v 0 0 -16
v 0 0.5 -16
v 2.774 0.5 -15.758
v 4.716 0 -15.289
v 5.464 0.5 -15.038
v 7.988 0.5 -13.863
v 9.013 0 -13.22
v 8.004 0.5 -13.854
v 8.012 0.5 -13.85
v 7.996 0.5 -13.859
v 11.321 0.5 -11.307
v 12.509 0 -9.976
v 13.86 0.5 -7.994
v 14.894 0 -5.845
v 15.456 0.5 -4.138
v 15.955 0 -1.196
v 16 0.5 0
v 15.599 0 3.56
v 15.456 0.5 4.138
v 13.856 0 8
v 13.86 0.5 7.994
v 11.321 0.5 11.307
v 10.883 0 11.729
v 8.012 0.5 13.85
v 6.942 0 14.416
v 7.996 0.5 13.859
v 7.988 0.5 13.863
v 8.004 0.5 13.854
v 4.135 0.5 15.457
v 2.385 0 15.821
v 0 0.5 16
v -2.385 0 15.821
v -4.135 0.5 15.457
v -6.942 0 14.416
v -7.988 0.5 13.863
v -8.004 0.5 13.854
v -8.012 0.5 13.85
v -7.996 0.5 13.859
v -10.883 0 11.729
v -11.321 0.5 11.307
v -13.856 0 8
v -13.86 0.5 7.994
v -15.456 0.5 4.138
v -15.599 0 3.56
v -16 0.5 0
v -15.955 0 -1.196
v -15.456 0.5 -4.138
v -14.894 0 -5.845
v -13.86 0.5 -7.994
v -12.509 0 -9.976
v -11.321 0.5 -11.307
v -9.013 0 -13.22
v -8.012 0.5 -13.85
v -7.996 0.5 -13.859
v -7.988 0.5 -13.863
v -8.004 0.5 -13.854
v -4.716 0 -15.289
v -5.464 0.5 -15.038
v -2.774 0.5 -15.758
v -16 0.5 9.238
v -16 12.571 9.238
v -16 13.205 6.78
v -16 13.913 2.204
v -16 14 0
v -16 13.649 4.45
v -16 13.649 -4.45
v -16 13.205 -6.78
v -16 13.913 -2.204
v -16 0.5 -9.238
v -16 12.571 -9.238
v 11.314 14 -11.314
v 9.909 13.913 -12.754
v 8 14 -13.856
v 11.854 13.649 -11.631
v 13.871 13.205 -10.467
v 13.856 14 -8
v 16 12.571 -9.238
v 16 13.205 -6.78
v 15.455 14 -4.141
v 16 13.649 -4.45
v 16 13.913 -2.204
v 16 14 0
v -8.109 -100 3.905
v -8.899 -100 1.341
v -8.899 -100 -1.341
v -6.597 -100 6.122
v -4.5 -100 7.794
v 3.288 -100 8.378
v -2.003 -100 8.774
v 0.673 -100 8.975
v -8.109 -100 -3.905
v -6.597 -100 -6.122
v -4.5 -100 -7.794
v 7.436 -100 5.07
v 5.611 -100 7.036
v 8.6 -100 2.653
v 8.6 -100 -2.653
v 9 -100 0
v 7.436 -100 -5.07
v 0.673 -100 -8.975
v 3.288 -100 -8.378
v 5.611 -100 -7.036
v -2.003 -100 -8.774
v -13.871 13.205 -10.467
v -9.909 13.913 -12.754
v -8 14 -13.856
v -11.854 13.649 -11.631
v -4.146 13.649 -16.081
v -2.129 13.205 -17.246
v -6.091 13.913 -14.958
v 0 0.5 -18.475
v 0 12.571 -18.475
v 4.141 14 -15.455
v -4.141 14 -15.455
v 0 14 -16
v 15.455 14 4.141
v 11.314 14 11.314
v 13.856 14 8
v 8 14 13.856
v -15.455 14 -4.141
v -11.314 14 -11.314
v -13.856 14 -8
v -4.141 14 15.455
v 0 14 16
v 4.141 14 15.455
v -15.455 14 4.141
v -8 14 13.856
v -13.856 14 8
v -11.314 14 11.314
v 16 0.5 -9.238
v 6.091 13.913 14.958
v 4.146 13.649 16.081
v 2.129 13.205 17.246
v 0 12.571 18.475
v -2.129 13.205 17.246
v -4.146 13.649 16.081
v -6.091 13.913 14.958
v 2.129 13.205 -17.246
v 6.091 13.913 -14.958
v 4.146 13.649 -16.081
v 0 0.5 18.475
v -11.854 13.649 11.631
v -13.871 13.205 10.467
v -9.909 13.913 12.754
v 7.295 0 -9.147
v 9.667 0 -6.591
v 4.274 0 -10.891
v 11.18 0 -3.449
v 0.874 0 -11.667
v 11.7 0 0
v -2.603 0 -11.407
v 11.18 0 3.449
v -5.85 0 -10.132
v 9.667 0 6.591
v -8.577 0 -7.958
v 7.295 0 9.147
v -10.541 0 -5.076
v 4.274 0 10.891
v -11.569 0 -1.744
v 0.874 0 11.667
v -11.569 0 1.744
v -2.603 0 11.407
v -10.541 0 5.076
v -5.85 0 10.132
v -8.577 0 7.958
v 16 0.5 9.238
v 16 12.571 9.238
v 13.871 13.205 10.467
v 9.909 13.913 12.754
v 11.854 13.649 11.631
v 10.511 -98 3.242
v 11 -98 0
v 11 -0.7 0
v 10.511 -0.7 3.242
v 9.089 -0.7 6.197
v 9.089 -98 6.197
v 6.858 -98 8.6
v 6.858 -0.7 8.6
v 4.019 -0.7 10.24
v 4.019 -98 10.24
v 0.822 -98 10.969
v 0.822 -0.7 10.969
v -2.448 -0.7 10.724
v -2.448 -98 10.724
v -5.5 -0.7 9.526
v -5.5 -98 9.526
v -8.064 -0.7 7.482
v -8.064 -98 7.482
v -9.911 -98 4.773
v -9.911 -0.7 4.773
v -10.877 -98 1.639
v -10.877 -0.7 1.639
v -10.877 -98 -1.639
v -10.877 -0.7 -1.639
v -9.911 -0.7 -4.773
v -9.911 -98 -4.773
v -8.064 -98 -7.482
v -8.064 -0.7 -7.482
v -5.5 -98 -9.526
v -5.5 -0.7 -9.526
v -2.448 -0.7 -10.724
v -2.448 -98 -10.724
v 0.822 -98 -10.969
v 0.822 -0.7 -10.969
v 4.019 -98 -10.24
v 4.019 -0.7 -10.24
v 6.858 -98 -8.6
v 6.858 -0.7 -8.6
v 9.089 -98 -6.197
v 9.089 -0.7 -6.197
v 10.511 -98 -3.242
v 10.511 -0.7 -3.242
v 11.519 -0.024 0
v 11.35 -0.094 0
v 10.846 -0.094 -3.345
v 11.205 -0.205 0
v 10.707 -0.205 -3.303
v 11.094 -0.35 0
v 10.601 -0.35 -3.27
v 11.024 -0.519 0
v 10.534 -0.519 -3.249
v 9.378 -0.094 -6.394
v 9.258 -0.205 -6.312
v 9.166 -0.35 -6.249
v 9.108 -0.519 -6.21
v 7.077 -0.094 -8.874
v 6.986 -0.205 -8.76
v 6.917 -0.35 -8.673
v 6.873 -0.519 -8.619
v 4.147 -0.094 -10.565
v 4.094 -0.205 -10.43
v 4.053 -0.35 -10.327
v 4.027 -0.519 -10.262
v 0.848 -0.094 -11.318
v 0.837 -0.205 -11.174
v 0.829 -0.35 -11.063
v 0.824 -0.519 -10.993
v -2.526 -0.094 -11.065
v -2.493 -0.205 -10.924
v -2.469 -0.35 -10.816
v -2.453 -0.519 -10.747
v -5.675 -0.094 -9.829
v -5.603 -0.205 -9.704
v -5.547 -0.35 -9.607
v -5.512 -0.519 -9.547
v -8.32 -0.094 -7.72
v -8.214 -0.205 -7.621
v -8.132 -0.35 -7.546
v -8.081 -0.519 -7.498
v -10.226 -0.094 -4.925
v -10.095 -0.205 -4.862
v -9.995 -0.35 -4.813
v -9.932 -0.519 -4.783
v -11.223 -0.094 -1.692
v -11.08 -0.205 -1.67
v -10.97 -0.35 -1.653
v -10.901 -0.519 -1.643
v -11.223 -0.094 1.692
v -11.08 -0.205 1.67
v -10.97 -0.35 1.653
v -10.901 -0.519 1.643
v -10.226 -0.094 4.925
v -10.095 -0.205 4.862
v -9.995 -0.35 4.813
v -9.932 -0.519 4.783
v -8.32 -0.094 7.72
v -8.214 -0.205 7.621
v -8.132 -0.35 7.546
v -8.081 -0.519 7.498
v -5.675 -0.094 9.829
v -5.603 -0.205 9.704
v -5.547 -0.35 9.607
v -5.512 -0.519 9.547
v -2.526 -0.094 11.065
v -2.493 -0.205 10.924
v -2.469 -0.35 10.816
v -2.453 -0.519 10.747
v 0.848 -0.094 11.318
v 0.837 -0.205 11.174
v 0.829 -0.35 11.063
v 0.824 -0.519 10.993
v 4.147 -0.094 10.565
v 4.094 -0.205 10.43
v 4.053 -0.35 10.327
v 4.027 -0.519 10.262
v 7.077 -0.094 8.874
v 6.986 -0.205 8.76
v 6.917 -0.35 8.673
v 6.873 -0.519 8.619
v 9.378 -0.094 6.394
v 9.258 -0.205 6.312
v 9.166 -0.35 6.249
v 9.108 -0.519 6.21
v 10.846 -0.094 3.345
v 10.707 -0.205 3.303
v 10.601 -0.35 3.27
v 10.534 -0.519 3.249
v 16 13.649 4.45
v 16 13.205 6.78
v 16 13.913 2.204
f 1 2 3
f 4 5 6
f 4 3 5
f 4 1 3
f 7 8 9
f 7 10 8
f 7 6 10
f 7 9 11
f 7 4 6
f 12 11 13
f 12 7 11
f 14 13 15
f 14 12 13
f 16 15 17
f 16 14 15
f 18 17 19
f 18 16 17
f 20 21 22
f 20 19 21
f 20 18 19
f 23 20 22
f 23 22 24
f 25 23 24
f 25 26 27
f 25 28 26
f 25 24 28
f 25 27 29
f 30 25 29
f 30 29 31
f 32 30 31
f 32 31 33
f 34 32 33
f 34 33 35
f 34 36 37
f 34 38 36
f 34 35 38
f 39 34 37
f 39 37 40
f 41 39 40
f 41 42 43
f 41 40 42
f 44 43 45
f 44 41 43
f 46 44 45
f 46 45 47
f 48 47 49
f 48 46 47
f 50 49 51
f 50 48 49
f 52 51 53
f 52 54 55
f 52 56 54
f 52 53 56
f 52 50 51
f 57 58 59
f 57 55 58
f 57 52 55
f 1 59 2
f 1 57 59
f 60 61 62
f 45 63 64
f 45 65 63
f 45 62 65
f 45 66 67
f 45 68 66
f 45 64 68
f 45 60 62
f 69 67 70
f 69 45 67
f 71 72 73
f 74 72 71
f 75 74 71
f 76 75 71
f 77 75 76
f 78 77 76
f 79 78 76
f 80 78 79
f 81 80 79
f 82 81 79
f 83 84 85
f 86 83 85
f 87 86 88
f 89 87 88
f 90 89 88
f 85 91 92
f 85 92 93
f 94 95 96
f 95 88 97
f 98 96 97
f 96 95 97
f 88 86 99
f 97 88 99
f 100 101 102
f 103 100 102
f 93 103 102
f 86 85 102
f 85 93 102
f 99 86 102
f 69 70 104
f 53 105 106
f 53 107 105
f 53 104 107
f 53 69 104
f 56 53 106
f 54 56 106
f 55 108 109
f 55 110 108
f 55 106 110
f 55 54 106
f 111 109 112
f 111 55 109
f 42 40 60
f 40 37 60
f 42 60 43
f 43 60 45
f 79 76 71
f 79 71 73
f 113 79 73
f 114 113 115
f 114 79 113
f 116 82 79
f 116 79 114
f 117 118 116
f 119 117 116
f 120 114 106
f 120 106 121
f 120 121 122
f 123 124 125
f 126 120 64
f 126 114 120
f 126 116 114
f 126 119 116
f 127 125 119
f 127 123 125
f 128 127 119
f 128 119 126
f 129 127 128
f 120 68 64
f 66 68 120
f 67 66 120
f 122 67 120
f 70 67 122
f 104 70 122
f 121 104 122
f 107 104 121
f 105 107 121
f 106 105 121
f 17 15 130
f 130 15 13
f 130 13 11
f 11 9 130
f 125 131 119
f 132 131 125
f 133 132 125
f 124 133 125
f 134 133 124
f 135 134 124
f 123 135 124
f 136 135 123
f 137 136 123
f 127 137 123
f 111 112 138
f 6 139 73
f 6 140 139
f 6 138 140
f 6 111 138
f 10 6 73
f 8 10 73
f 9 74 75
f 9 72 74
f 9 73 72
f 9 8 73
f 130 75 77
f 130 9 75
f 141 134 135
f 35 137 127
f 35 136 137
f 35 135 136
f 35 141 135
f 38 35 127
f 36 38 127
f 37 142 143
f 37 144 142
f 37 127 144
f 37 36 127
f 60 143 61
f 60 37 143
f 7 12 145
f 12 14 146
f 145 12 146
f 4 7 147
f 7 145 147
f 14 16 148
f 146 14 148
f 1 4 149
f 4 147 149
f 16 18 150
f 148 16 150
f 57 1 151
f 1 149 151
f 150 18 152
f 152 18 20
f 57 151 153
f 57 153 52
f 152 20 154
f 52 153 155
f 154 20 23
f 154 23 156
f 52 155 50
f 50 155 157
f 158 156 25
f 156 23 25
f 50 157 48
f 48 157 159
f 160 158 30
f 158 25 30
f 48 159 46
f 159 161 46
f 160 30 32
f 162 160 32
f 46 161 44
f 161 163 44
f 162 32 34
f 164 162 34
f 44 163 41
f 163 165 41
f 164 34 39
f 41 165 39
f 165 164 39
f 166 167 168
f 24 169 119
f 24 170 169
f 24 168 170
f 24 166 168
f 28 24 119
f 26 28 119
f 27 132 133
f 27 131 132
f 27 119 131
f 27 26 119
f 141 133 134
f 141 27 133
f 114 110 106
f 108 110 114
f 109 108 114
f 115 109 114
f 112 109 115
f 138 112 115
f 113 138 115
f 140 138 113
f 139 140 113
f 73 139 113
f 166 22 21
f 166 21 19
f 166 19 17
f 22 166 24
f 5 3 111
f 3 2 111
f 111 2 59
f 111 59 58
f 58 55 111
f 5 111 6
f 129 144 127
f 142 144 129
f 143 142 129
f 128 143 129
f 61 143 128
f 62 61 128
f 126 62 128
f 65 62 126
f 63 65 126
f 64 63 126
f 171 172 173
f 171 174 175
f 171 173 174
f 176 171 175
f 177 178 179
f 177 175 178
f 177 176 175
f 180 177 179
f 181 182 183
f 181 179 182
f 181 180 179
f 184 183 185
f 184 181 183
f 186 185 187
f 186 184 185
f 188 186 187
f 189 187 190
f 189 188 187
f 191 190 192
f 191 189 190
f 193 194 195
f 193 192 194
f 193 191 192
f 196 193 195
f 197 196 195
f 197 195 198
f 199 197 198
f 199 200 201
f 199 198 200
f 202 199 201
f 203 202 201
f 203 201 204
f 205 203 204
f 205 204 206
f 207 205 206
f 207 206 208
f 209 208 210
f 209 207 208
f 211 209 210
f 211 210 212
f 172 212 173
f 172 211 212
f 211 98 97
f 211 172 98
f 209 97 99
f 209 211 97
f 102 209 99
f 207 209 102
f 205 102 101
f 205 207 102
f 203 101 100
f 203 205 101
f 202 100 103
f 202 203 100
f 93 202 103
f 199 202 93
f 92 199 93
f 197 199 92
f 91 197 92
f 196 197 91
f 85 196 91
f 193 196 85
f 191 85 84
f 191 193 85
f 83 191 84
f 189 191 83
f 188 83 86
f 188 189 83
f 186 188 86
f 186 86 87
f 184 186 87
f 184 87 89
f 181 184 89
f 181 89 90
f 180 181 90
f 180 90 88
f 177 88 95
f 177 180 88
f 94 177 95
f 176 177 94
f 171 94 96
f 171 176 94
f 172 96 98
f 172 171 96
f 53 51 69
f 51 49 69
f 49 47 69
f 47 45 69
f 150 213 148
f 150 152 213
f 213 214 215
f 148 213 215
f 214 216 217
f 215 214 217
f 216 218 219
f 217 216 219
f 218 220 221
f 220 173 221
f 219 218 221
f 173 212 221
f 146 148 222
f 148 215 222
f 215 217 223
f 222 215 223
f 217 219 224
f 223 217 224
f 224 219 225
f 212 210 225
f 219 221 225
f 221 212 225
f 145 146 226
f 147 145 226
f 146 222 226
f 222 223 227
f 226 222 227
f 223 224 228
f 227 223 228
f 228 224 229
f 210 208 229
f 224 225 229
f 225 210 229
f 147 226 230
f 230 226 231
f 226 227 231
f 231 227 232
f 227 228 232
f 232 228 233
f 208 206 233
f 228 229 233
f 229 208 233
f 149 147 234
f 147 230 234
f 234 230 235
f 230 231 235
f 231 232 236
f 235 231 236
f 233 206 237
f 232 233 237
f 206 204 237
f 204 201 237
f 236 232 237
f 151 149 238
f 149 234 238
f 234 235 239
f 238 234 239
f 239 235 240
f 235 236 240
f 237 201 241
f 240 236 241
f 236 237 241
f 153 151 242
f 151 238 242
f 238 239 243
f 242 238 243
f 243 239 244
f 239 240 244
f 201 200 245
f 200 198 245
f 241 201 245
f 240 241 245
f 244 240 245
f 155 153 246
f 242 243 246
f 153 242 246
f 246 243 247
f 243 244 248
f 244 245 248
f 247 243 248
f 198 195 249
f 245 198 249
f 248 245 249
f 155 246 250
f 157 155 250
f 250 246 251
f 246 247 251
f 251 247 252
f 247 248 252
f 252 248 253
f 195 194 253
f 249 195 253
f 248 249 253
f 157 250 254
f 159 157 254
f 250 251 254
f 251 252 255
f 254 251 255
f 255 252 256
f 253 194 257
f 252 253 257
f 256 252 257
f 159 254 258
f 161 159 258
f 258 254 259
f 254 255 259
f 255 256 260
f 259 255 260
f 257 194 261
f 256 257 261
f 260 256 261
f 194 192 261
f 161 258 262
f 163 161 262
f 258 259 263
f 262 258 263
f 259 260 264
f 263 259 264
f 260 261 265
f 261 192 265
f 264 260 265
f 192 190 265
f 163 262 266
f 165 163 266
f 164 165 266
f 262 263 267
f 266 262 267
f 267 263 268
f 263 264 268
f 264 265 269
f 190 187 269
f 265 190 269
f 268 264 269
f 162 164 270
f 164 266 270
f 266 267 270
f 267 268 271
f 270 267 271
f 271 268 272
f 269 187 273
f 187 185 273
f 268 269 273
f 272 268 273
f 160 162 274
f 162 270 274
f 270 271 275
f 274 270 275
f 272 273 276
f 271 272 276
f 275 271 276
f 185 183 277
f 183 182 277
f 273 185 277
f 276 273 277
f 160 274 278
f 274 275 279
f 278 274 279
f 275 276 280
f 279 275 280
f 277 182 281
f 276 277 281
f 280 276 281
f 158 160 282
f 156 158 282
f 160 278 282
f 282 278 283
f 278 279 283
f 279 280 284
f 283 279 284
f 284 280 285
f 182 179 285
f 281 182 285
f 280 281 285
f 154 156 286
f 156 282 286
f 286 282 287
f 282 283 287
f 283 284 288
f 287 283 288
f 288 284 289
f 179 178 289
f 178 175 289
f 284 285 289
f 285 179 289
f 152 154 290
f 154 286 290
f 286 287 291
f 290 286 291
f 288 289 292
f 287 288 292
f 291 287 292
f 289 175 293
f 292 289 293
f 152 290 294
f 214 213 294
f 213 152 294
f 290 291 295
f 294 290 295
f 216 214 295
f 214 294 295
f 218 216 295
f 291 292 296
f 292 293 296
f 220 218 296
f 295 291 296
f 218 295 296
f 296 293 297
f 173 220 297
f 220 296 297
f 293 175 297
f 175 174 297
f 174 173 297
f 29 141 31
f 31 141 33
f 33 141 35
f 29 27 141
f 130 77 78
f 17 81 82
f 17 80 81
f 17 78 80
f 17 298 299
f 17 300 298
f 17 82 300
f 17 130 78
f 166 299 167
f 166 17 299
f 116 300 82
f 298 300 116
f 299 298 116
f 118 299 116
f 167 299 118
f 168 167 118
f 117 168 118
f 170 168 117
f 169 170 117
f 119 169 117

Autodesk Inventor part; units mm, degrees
ref_plane "YZ Plane" through (0, 0, 0) normal (1, 0, 0) x (0, 1, 0)
ref_plane "XZ Plane" through (0, 0, 0) normal (0, 1, 0) x (-1, 0, 0)
ref_plane "XY Plane" through (0, 0, 0) normal (0, 0, 1) x (1, 0, 0)
sketch "Sketch1" plane through (0, 0, 0) normal (0, 1, 0) x (-1, 0, 0)
  line L0 (127.8939, 73.8396) -> (127.8939, -73.8396)
  line L1 (127.8939, -73.8396) -> (0, -147.6791)
  line L2 (0, -147.6791) -> (-127.8939, -73.8396)
  line L3 (-127.8939, -73.8396) -> (-127.8939, 73.8396)
  line L4 (-127.8939, 73.8396) -> (0, 147.6791)
  line L5 (0, 147.6791) -> (127.8939, 73.8396)
  line L6 (-16, 9.2376) -> (0, 18.4752)
  line L7 (0, 18.4752) -> (16, 9.2376)
  line L8 (16, 9.2376) -> (16, -9.2376)
  line L9 (16, -9.2376) -> (0, -18.4752)
  line L10 (0, -18.4752) -> (-16, -9.2376)
  line L11 (-16, -9.2376) -> (-16, 9.2376)
  point P0 (0, 0)
  point P1 (0, 0)
  point P2 (0, 0)
  dimension "Shex" = 32
extrude "Extrusion1" add sketch "Sketch1" along normal blind 14 contours L6 L7 L8 L9 L10 L11
sketch "Sketch2" plane through (0, 0, 0) normal (1, 0, 0) x (0, 1, 0)
  line L0 (0, -18.4752) -> (14, -18.4752) construction
  line L1 (14, -18.4752) -> (12.5709, -18.4752)
  line L2 (12.5709, -18.4752) -> (14, -16)
  line L3 (14, -16) -> (14, -18.4752)
  line L4 (-3, 0) -> (18, 0) projected
  point P0 (0, 0)
  dimension "d4" = 60
  dimension "d5" = 32
revolve "Revolution1" cut sketch "Sketch2" angle 360 about axis through (0, -10, 0) along (0, 1, 0)
sketch "Sketch3" plane through (0, 0, 0) normal (0, 0, 1) x (1, 0, 0)
  line L0 (0, 0) -> (11, 0)
  line L1 (11, 0) -> (11, -100)
  line L2 (11, -100) -> (0, -100)
  line L3 (0, -100) -> (0, 0)
  dimension "L" = 100
  dimension "Dia" = 22
revolve "Revolution2" add sketch "Sketch3" angle 360 about axis through (0, -100, 0) along (0, 1, 0)
fillet "Fillet1" radius 0.7 1 edges at (-11, 0, 0)
chamfer "Chamfer1" distance 2 angle 45 1 edges at (-11, -100, 0)
thread "Thread2" size "M24x3" class "6g" standard "ANSI Metric M Profile" length 52
sketch "Sketch6" plane through (0, 0, 0) normal (1, 0, 0) x (0, 1, 0)
  line L0 (-3.0757, 0) -> (18.4544, 0) projected
  line L1 (0, -18.4752) -> (12.5709, -18.4752) projected
  line L2 (0, -18.4752) -> (0, -9.2376) projected
  line L3 (0, -9.2376) -> (12.5709, -9.2376) projected
  line L4 (0, -18.4752) -> (0.5, -18.4752)
  line L5 (0.5, -18.4752) -> (0.5, -16)
  line L6 (0.5, -16) -> (0, -16)
  line L7 (0, -16) -> (0, -18.4752)
  point P0 (0, 0)
  point P1 (14, -13.8564)
  point P2 (0, -16)
  dimension "a" = 0.5
  dimension "d34" = 32
revolve "Revolution3" cut sketch "Sketch6" angle 360 about axis through (0, -10, 0) along (0, 1, 0)
equation "\"d5\" = Shex"
equation "\"d31\" = b - cham"
equation "\"d34\" = Shex"
equation "\"b\" = 54"
equation "\"cham\" = 2"
properties part number "SCREW M24x120-01-02" material "Steel"
